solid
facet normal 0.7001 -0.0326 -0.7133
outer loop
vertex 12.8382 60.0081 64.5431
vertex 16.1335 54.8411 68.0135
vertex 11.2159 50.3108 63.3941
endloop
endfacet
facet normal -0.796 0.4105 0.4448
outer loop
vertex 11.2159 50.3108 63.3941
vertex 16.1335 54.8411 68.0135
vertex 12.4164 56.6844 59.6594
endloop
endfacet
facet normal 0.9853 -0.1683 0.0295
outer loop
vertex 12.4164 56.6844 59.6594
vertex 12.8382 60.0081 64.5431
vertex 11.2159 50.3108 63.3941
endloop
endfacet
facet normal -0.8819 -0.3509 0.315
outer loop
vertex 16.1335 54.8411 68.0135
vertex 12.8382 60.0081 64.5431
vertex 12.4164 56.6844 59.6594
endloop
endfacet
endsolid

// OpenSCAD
// Auto-generated auxetic polyhedron
points = [
    [11.215908, 50.310784, 63.394087],
    [16.133461, 54.841127, 68.013537],
    [12.838162, 60.008106, 64.543070],
    [12.416419, 56.684375, 59.659412],
];

faces = [
    [0, 1, 2],
    [3, 1, 0],
    [0, 2, 3],
    [3, 2, 1],
];

polyhedron(points = points, faces = faces);
